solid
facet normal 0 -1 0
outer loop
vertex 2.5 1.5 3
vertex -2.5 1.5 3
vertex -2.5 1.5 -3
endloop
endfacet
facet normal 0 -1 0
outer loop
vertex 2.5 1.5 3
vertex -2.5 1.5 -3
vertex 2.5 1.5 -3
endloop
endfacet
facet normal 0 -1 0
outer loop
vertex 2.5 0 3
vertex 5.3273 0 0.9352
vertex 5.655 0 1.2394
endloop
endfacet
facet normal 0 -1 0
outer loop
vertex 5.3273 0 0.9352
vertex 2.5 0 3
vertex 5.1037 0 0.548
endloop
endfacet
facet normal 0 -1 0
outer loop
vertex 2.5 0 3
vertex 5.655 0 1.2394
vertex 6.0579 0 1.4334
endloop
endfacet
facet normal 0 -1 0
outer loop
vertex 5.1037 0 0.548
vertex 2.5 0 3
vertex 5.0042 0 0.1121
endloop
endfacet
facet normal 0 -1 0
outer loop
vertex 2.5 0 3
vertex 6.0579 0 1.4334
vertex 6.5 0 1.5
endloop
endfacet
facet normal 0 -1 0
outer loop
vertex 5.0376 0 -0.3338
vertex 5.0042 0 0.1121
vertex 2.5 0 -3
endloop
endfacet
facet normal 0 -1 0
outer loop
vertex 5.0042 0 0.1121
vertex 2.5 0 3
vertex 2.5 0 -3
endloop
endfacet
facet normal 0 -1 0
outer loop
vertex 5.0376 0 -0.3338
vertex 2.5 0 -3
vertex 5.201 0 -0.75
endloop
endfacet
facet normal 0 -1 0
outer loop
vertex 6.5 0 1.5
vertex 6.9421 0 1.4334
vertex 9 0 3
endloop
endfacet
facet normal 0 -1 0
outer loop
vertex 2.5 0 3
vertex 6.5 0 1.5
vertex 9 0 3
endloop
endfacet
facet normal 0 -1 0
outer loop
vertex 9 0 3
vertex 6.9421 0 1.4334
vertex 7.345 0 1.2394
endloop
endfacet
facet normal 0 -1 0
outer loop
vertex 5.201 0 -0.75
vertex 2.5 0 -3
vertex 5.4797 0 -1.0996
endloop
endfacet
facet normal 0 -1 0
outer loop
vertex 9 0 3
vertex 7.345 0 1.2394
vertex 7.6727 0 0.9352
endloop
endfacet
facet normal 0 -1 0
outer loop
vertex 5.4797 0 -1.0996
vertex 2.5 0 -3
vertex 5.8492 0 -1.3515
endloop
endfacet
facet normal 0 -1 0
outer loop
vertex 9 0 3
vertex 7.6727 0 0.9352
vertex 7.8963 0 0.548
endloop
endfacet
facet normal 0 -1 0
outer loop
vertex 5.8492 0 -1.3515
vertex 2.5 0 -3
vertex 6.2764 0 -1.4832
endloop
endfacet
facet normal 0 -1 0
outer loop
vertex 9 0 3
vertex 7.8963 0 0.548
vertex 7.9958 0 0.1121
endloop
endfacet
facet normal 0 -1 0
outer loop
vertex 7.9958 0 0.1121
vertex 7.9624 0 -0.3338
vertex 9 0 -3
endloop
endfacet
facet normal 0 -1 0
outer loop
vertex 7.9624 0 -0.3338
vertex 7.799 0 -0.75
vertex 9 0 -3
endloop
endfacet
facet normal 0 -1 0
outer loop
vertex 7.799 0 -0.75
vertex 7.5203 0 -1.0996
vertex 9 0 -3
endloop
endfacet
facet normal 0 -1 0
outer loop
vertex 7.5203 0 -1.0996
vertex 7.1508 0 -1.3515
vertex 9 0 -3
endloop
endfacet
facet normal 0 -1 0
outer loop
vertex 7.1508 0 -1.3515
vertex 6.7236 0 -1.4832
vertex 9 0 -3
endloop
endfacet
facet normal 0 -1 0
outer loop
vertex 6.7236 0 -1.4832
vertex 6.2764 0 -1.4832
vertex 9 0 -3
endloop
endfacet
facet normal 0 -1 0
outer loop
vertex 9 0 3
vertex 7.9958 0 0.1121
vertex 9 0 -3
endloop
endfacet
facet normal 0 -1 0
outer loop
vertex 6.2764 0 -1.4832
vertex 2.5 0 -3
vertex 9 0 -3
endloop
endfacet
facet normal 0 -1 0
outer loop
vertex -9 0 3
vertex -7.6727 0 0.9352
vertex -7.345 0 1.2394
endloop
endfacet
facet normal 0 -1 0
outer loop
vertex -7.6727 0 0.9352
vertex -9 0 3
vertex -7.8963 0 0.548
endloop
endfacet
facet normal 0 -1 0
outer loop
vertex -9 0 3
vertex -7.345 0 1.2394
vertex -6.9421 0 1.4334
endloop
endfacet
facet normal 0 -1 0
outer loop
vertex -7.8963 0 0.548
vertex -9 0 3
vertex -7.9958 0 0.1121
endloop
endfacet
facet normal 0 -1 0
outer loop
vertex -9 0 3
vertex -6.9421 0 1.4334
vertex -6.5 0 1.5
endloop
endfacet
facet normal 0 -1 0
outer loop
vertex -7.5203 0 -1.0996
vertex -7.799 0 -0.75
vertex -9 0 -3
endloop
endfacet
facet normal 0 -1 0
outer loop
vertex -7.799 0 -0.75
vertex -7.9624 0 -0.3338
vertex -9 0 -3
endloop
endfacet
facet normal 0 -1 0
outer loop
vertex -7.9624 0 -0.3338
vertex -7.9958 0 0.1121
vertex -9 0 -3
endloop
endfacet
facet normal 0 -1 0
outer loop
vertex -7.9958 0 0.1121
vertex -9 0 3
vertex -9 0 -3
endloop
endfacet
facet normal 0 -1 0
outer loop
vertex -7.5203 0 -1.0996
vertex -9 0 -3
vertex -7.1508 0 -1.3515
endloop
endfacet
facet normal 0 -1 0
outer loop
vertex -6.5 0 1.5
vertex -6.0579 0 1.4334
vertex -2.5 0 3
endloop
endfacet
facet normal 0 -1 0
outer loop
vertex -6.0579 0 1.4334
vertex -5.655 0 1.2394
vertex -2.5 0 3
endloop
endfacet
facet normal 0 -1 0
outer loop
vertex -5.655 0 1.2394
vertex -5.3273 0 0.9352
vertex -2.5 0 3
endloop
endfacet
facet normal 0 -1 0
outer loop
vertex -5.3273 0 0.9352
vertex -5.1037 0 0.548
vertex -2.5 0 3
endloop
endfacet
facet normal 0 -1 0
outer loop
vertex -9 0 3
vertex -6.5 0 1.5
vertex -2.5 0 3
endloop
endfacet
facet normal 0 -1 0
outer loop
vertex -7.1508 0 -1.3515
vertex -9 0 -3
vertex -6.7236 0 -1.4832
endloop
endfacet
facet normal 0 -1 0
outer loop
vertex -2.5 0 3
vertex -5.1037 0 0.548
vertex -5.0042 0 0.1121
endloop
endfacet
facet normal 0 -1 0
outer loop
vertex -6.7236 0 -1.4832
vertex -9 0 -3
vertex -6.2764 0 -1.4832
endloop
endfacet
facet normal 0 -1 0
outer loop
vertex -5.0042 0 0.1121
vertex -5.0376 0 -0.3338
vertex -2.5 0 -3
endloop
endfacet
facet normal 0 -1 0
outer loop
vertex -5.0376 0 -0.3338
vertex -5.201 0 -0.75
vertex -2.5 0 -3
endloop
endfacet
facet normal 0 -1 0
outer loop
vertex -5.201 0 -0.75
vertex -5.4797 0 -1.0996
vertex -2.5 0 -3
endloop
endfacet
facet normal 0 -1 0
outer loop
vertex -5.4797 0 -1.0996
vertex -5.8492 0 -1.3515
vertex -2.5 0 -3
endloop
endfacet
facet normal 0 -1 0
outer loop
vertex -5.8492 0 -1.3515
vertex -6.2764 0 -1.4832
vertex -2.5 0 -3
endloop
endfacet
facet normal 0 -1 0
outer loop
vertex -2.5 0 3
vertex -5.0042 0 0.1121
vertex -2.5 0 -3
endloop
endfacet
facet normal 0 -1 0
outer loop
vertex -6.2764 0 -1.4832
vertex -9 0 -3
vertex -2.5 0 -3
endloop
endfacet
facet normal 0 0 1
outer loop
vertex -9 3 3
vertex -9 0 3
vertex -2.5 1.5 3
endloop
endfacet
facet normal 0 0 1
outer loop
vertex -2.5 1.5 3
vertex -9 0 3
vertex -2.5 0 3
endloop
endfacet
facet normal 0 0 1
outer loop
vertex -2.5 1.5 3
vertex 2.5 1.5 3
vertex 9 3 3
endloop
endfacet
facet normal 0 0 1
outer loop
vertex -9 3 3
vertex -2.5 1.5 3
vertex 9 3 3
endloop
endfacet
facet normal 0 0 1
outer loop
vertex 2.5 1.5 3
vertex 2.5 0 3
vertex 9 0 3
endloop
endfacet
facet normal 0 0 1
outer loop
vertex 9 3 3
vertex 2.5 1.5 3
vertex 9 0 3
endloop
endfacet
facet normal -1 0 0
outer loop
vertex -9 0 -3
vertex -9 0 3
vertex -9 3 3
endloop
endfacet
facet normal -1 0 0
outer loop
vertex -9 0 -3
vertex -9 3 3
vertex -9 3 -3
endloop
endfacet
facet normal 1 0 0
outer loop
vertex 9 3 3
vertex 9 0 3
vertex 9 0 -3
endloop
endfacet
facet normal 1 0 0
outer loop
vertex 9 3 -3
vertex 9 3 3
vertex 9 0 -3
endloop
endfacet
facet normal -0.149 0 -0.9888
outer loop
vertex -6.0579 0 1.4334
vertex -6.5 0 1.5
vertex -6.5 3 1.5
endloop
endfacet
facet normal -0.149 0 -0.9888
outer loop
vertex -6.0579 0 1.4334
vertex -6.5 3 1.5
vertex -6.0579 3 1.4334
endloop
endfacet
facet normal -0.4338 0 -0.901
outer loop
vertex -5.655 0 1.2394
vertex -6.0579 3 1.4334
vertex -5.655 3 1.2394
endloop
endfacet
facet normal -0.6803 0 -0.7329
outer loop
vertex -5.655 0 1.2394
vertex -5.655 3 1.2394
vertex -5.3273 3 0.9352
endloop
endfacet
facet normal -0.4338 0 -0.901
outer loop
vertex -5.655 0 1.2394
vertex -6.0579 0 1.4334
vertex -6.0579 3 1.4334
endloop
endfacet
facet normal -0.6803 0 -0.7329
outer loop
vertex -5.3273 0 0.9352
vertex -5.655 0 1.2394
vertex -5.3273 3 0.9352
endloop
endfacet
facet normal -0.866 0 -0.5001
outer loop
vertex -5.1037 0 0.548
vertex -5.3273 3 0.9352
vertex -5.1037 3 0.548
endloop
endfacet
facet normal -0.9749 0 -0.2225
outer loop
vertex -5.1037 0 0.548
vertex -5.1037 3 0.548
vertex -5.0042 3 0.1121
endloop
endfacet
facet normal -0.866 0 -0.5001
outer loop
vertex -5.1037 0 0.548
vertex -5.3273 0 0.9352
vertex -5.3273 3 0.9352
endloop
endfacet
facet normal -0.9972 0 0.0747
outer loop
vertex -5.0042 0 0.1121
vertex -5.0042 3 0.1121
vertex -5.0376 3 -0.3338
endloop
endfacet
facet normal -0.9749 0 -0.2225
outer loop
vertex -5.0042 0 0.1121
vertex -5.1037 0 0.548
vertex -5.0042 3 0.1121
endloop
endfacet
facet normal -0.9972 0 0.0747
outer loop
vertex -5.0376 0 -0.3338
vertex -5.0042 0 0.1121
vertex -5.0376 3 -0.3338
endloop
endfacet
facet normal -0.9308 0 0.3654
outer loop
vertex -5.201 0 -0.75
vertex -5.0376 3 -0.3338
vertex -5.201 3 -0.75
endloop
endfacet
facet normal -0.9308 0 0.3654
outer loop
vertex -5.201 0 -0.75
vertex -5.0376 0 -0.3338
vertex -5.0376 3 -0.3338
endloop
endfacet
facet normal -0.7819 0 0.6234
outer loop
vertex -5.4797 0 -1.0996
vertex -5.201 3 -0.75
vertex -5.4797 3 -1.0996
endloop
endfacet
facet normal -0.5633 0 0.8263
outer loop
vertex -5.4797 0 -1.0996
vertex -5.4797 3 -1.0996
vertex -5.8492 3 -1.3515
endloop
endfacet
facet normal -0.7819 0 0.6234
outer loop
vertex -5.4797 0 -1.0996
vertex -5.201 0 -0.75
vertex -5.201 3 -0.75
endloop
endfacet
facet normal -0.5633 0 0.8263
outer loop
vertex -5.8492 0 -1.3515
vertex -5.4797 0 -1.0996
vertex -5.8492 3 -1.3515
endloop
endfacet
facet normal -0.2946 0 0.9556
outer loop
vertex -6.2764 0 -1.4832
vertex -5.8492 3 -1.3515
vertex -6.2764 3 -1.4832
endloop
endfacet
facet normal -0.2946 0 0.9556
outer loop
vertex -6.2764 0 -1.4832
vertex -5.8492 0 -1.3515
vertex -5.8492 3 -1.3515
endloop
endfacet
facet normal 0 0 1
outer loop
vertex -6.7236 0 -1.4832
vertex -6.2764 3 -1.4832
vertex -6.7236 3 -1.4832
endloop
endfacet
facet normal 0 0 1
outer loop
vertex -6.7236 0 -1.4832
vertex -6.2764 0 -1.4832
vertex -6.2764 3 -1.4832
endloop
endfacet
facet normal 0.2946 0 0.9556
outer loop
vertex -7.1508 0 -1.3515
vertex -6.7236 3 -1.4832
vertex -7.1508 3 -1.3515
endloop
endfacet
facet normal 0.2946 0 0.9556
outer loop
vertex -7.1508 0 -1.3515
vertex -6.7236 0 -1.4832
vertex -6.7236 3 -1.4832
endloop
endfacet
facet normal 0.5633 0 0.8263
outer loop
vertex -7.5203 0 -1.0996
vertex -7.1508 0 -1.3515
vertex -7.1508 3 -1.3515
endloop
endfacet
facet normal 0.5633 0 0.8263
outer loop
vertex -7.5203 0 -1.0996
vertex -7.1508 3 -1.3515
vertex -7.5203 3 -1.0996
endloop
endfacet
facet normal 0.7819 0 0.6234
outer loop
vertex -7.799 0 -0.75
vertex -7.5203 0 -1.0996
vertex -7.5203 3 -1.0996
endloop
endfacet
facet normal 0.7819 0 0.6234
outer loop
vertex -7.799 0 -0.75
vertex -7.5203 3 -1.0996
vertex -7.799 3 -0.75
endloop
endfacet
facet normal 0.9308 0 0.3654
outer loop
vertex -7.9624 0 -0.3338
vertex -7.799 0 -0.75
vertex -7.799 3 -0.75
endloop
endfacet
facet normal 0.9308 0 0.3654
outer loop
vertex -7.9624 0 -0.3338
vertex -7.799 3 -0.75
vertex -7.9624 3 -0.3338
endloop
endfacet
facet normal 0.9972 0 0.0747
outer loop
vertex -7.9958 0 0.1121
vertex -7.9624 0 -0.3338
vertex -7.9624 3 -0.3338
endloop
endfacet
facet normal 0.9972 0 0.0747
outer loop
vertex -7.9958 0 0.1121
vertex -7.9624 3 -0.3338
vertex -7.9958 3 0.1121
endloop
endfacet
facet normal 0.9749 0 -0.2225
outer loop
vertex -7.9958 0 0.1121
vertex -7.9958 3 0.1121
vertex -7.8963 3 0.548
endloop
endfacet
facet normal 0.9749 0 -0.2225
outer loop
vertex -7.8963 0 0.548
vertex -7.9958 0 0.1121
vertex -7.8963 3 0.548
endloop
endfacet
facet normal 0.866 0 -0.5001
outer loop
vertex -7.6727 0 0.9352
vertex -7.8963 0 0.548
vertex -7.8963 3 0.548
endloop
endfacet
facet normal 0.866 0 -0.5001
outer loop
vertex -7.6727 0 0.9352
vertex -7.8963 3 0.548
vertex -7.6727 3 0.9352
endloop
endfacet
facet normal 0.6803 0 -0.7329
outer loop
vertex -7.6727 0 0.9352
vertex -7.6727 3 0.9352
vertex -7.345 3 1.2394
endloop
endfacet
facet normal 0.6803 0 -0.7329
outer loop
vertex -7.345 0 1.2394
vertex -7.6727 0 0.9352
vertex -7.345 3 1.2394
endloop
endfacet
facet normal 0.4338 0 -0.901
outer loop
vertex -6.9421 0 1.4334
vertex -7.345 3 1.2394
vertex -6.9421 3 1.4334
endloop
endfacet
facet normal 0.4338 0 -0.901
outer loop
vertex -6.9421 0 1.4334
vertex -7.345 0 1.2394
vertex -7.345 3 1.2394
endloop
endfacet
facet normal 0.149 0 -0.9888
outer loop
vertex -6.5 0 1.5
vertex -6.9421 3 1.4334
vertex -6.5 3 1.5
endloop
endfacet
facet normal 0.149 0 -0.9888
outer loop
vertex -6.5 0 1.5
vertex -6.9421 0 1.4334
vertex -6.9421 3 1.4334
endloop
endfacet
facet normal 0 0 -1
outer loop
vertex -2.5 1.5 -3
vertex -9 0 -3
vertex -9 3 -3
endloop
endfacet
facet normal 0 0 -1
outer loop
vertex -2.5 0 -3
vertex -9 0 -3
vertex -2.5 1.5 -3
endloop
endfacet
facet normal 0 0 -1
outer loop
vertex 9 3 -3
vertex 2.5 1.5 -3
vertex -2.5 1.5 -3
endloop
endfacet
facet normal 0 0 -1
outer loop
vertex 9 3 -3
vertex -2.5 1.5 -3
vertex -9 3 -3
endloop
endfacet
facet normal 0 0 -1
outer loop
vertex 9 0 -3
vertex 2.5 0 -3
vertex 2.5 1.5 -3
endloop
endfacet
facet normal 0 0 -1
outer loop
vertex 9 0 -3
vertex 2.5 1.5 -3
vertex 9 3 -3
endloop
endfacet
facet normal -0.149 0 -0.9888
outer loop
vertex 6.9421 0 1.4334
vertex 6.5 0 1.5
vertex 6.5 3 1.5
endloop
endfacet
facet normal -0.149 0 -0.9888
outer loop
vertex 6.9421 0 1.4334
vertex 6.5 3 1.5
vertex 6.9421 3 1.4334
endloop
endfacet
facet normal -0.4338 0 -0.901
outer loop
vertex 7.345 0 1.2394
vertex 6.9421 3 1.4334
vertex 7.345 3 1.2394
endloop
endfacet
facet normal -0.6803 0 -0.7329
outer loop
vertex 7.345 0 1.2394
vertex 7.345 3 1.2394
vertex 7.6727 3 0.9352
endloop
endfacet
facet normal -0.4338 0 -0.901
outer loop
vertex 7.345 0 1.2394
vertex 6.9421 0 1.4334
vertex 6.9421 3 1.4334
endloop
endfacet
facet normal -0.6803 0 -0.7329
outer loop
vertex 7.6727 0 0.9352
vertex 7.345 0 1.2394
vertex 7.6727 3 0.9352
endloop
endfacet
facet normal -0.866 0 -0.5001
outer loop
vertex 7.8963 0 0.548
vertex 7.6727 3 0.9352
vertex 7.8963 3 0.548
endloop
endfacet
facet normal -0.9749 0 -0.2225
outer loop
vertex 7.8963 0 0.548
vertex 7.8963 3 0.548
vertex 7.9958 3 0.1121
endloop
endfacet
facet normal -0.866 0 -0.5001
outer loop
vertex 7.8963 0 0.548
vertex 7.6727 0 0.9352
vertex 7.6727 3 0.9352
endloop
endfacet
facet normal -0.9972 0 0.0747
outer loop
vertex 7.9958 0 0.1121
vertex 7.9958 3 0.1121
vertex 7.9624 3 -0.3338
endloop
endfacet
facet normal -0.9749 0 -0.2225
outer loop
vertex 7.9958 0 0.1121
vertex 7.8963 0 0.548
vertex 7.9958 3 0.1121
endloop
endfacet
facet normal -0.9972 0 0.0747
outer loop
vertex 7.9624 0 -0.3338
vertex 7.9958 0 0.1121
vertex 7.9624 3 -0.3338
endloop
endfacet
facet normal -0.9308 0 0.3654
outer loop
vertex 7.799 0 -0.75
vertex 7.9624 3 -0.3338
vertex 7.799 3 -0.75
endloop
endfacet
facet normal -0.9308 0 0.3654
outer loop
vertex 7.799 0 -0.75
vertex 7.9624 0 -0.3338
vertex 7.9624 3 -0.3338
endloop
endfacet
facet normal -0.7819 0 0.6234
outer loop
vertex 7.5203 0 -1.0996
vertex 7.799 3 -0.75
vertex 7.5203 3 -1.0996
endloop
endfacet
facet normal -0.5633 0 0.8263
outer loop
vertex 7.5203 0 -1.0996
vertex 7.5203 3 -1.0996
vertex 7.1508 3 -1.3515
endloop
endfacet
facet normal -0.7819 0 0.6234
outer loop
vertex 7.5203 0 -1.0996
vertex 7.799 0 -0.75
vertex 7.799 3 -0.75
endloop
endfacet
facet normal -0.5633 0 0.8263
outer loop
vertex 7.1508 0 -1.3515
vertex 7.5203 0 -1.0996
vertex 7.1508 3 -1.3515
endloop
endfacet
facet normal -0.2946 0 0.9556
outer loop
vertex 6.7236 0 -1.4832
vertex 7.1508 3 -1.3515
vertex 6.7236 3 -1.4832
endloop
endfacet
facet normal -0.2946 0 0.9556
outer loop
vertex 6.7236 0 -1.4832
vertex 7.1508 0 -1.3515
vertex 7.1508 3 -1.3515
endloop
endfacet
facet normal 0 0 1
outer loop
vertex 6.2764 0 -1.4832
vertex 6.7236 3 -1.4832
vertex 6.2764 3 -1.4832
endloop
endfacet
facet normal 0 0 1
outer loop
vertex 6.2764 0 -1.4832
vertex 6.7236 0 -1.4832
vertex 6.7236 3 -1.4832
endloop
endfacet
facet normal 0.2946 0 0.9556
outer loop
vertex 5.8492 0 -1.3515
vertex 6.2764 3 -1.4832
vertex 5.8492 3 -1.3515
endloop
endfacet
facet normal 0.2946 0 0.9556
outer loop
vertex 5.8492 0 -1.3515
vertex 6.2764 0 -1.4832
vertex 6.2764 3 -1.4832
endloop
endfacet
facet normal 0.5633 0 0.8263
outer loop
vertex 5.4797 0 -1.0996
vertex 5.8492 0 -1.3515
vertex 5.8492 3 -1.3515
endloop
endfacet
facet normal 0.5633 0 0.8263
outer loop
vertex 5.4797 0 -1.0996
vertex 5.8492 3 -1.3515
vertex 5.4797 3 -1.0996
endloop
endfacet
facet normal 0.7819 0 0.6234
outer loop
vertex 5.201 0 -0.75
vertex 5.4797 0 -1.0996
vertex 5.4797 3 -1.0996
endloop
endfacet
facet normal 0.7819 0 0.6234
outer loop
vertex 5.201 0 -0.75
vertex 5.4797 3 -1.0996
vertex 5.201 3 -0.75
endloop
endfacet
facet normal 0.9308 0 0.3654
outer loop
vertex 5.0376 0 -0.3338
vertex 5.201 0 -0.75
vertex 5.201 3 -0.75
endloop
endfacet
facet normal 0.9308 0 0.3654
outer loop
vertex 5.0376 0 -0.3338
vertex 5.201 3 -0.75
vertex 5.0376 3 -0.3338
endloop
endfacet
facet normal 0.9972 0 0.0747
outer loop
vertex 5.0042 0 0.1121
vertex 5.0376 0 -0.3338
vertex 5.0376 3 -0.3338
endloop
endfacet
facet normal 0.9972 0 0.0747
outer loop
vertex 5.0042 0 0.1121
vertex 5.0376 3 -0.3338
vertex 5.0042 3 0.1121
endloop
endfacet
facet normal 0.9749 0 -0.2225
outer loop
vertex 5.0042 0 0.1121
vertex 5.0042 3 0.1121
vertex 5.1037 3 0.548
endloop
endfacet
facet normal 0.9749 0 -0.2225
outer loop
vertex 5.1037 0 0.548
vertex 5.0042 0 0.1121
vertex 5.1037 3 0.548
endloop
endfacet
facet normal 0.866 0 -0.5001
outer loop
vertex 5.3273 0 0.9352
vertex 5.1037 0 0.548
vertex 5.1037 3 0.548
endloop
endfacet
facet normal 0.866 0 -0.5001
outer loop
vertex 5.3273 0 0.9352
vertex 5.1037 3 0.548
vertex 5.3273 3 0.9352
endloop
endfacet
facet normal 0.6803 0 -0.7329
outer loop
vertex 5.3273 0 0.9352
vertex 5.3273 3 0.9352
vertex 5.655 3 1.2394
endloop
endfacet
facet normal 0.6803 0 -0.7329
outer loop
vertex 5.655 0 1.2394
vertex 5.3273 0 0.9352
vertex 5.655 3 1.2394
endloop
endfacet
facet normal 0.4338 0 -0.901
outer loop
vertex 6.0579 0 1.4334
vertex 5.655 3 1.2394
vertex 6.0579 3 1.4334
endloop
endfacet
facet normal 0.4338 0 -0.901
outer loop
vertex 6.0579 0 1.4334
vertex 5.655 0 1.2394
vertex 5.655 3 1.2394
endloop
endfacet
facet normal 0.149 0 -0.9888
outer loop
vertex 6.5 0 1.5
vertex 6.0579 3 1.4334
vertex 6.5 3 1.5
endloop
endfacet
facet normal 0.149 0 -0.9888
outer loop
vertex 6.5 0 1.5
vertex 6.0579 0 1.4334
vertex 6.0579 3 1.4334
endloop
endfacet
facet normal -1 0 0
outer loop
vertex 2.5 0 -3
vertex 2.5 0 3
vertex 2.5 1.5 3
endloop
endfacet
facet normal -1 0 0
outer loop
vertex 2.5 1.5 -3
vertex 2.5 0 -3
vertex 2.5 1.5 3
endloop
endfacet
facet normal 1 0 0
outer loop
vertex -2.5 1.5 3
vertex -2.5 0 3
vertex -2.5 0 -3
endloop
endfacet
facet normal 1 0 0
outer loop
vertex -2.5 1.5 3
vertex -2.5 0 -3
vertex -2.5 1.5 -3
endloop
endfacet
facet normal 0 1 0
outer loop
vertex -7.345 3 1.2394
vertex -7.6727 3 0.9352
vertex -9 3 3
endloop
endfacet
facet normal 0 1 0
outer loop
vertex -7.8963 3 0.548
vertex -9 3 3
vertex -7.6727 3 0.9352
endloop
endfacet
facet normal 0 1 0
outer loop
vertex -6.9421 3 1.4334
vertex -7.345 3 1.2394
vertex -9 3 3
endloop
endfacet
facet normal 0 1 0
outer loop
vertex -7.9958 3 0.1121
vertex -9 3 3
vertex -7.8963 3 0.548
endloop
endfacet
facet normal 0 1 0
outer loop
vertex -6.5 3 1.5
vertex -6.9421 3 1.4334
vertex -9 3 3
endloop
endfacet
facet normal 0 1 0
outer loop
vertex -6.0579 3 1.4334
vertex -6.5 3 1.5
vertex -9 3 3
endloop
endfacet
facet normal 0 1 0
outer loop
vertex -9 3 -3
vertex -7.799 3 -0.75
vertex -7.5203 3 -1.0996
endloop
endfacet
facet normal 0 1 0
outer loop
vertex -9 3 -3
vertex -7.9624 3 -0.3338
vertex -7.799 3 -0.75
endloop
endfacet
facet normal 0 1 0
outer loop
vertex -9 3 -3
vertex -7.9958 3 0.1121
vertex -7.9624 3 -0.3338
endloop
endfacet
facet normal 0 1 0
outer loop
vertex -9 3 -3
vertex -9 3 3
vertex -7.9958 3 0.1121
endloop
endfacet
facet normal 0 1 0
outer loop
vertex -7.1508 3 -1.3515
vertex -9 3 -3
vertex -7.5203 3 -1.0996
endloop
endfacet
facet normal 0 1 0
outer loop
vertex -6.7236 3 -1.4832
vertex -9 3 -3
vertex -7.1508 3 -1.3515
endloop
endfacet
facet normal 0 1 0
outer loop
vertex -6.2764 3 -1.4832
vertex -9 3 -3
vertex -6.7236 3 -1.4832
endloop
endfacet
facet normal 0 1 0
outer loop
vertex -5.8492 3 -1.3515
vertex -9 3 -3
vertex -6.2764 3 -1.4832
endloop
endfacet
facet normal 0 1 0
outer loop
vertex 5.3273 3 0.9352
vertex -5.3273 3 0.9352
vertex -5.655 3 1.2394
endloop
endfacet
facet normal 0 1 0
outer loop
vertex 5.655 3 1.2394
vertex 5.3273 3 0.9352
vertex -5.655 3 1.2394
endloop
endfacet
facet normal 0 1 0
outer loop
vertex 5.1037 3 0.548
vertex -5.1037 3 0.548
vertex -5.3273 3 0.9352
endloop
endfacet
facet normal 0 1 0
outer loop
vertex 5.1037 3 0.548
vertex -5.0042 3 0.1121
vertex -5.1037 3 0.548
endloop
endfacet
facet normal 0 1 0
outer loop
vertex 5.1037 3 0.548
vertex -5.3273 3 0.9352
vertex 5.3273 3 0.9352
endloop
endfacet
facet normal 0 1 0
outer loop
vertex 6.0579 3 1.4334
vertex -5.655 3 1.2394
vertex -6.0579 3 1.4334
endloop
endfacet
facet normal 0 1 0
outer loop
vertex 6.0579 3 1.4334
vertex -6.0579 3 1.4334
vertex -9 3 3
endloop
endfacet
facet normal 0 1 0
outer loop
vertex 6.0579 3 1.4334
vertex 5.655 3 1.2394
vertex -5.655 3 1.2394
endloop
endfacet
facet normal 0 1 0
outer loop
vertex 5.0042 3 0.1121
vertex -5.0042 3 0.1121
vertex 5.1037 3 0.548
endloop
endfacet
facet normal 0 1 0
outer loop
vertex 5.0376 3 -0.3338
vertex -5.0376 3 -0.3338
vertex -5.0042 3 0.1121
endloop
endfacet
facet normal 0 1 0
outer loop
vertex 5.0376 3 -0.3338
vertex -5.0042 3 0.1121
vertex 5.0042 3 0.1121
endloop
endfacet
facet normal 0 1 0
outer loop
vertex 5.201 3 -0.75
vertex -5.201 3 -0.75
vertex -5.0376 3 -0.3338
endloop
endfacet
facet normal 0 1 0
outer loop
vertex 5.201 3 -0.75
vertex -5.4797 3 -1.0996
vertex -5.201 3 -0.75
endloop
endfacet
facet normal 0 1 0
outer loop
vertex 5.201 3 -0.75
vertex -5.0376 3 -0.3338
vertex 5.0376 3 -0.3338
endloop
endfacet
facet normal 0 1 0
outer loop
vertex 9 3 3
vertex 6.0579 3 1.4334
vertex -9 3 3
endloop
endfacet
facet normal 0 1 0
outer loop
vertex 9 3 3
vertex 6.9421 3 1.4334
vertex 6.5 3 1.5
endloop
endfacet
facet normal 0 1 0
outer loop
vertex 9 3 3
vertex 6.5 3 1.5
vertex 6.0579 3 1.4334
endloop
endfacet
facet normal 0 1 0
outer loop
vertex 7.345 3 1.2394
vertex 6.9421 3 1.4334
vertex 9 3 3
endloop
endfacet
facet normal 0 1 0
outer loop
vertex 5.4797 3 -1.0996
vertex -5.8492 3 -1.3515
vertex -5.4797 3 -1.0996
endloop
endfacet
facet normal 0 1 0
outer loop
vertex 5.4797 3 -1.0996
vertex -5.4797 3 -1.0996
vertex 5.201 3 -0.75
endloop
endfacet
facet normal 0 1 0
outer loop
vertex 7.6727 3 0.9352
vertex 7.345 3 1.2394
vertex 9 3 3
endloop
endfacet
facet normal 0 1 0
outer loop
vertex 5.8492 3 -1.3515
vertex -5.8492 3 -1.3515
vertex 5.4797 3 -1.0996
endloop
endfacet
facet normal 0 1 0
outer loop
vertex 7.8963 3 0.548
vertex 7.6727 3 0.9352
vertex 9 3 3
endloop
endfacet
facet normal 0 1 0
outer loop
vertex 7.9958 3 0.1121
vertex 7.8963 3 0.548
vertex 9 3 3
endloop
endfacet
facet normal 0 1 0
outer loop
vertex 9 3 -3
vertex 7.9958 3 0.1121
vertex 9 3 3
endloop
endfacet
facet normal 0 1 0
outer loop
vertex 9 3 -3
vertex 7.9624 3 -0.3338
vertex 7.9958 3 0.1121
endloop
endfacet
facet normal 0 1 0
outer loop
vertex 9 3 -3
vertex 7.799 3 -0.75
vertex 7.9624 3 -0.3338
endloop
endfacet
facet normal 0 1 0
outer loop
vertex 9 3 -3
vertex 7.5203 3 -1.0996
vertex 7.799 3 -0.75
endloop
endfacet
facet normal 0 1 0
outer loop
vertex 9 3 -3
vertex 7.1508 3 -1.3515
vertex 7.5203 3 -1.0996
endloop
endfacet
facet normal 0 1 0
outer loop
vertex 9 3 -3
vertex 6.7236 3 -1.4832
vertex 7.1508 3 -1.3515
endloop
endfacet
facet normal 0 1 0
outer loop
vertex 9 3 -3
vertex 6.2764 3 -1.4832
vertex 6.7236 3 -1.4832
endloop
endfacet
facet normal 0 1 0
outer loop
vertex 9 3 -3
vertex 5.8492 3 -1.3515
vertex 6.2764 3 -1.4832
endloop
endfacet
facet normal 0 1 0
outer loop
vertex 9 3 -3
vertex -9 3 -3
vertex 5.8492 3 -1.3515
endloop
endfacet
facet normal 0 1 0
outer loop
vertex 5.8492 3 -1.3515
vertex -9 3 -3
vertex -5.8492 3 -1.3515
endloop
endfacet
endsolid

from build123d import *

# Parameters (mm, degrees)
SKETCH1_W           = 18
SKETCH1_H           = 6
SKETCH1_R           = 1.5
BOSS_EXTRUDE1_DEPTH = 3
SKETCH2_W           = 5
SKETCH2_H           = 1.5
CUT_EXTRUDE1_DEPTH  = 12.22497216


with BuildPart() as part:
    # Sketch1 → Boss-Extrude1 (new body)
    with BuildSketch(Plane(origin=(0, 0, 0), x_dir=(1, 0, 0), z_dir=(0, 1, 0))):
        Rectangle(SKETCH1_W, SKETCH1_H)
        with Locations(Location((-6.5, 0, 0), (0, 0, 270))):
            Circle(SKETCH1_R, mode=Mode.SUBTRACT)
        with Locations(Location((6.5, 0, 0), (0, 0, 270))):
            Circle(SKETCH1_R, mode=Mode.SUBTRACT)
    extrude(amount=BOSS_EXTRUDE1_DEPTH)

    # Sketch2 → Cut-Extrude1 (cut, through all)
    with BuildSketch(Plane.XY.offset(3)):
        with Locations((0, 0.75)):
            Rectangle(SKETCH2_W, SKETCH2_H)
    extrude(amount=-CUT_EXTRUDE1_DEPTH, mode=Mode.SUBTRACT)


solid = part.part
